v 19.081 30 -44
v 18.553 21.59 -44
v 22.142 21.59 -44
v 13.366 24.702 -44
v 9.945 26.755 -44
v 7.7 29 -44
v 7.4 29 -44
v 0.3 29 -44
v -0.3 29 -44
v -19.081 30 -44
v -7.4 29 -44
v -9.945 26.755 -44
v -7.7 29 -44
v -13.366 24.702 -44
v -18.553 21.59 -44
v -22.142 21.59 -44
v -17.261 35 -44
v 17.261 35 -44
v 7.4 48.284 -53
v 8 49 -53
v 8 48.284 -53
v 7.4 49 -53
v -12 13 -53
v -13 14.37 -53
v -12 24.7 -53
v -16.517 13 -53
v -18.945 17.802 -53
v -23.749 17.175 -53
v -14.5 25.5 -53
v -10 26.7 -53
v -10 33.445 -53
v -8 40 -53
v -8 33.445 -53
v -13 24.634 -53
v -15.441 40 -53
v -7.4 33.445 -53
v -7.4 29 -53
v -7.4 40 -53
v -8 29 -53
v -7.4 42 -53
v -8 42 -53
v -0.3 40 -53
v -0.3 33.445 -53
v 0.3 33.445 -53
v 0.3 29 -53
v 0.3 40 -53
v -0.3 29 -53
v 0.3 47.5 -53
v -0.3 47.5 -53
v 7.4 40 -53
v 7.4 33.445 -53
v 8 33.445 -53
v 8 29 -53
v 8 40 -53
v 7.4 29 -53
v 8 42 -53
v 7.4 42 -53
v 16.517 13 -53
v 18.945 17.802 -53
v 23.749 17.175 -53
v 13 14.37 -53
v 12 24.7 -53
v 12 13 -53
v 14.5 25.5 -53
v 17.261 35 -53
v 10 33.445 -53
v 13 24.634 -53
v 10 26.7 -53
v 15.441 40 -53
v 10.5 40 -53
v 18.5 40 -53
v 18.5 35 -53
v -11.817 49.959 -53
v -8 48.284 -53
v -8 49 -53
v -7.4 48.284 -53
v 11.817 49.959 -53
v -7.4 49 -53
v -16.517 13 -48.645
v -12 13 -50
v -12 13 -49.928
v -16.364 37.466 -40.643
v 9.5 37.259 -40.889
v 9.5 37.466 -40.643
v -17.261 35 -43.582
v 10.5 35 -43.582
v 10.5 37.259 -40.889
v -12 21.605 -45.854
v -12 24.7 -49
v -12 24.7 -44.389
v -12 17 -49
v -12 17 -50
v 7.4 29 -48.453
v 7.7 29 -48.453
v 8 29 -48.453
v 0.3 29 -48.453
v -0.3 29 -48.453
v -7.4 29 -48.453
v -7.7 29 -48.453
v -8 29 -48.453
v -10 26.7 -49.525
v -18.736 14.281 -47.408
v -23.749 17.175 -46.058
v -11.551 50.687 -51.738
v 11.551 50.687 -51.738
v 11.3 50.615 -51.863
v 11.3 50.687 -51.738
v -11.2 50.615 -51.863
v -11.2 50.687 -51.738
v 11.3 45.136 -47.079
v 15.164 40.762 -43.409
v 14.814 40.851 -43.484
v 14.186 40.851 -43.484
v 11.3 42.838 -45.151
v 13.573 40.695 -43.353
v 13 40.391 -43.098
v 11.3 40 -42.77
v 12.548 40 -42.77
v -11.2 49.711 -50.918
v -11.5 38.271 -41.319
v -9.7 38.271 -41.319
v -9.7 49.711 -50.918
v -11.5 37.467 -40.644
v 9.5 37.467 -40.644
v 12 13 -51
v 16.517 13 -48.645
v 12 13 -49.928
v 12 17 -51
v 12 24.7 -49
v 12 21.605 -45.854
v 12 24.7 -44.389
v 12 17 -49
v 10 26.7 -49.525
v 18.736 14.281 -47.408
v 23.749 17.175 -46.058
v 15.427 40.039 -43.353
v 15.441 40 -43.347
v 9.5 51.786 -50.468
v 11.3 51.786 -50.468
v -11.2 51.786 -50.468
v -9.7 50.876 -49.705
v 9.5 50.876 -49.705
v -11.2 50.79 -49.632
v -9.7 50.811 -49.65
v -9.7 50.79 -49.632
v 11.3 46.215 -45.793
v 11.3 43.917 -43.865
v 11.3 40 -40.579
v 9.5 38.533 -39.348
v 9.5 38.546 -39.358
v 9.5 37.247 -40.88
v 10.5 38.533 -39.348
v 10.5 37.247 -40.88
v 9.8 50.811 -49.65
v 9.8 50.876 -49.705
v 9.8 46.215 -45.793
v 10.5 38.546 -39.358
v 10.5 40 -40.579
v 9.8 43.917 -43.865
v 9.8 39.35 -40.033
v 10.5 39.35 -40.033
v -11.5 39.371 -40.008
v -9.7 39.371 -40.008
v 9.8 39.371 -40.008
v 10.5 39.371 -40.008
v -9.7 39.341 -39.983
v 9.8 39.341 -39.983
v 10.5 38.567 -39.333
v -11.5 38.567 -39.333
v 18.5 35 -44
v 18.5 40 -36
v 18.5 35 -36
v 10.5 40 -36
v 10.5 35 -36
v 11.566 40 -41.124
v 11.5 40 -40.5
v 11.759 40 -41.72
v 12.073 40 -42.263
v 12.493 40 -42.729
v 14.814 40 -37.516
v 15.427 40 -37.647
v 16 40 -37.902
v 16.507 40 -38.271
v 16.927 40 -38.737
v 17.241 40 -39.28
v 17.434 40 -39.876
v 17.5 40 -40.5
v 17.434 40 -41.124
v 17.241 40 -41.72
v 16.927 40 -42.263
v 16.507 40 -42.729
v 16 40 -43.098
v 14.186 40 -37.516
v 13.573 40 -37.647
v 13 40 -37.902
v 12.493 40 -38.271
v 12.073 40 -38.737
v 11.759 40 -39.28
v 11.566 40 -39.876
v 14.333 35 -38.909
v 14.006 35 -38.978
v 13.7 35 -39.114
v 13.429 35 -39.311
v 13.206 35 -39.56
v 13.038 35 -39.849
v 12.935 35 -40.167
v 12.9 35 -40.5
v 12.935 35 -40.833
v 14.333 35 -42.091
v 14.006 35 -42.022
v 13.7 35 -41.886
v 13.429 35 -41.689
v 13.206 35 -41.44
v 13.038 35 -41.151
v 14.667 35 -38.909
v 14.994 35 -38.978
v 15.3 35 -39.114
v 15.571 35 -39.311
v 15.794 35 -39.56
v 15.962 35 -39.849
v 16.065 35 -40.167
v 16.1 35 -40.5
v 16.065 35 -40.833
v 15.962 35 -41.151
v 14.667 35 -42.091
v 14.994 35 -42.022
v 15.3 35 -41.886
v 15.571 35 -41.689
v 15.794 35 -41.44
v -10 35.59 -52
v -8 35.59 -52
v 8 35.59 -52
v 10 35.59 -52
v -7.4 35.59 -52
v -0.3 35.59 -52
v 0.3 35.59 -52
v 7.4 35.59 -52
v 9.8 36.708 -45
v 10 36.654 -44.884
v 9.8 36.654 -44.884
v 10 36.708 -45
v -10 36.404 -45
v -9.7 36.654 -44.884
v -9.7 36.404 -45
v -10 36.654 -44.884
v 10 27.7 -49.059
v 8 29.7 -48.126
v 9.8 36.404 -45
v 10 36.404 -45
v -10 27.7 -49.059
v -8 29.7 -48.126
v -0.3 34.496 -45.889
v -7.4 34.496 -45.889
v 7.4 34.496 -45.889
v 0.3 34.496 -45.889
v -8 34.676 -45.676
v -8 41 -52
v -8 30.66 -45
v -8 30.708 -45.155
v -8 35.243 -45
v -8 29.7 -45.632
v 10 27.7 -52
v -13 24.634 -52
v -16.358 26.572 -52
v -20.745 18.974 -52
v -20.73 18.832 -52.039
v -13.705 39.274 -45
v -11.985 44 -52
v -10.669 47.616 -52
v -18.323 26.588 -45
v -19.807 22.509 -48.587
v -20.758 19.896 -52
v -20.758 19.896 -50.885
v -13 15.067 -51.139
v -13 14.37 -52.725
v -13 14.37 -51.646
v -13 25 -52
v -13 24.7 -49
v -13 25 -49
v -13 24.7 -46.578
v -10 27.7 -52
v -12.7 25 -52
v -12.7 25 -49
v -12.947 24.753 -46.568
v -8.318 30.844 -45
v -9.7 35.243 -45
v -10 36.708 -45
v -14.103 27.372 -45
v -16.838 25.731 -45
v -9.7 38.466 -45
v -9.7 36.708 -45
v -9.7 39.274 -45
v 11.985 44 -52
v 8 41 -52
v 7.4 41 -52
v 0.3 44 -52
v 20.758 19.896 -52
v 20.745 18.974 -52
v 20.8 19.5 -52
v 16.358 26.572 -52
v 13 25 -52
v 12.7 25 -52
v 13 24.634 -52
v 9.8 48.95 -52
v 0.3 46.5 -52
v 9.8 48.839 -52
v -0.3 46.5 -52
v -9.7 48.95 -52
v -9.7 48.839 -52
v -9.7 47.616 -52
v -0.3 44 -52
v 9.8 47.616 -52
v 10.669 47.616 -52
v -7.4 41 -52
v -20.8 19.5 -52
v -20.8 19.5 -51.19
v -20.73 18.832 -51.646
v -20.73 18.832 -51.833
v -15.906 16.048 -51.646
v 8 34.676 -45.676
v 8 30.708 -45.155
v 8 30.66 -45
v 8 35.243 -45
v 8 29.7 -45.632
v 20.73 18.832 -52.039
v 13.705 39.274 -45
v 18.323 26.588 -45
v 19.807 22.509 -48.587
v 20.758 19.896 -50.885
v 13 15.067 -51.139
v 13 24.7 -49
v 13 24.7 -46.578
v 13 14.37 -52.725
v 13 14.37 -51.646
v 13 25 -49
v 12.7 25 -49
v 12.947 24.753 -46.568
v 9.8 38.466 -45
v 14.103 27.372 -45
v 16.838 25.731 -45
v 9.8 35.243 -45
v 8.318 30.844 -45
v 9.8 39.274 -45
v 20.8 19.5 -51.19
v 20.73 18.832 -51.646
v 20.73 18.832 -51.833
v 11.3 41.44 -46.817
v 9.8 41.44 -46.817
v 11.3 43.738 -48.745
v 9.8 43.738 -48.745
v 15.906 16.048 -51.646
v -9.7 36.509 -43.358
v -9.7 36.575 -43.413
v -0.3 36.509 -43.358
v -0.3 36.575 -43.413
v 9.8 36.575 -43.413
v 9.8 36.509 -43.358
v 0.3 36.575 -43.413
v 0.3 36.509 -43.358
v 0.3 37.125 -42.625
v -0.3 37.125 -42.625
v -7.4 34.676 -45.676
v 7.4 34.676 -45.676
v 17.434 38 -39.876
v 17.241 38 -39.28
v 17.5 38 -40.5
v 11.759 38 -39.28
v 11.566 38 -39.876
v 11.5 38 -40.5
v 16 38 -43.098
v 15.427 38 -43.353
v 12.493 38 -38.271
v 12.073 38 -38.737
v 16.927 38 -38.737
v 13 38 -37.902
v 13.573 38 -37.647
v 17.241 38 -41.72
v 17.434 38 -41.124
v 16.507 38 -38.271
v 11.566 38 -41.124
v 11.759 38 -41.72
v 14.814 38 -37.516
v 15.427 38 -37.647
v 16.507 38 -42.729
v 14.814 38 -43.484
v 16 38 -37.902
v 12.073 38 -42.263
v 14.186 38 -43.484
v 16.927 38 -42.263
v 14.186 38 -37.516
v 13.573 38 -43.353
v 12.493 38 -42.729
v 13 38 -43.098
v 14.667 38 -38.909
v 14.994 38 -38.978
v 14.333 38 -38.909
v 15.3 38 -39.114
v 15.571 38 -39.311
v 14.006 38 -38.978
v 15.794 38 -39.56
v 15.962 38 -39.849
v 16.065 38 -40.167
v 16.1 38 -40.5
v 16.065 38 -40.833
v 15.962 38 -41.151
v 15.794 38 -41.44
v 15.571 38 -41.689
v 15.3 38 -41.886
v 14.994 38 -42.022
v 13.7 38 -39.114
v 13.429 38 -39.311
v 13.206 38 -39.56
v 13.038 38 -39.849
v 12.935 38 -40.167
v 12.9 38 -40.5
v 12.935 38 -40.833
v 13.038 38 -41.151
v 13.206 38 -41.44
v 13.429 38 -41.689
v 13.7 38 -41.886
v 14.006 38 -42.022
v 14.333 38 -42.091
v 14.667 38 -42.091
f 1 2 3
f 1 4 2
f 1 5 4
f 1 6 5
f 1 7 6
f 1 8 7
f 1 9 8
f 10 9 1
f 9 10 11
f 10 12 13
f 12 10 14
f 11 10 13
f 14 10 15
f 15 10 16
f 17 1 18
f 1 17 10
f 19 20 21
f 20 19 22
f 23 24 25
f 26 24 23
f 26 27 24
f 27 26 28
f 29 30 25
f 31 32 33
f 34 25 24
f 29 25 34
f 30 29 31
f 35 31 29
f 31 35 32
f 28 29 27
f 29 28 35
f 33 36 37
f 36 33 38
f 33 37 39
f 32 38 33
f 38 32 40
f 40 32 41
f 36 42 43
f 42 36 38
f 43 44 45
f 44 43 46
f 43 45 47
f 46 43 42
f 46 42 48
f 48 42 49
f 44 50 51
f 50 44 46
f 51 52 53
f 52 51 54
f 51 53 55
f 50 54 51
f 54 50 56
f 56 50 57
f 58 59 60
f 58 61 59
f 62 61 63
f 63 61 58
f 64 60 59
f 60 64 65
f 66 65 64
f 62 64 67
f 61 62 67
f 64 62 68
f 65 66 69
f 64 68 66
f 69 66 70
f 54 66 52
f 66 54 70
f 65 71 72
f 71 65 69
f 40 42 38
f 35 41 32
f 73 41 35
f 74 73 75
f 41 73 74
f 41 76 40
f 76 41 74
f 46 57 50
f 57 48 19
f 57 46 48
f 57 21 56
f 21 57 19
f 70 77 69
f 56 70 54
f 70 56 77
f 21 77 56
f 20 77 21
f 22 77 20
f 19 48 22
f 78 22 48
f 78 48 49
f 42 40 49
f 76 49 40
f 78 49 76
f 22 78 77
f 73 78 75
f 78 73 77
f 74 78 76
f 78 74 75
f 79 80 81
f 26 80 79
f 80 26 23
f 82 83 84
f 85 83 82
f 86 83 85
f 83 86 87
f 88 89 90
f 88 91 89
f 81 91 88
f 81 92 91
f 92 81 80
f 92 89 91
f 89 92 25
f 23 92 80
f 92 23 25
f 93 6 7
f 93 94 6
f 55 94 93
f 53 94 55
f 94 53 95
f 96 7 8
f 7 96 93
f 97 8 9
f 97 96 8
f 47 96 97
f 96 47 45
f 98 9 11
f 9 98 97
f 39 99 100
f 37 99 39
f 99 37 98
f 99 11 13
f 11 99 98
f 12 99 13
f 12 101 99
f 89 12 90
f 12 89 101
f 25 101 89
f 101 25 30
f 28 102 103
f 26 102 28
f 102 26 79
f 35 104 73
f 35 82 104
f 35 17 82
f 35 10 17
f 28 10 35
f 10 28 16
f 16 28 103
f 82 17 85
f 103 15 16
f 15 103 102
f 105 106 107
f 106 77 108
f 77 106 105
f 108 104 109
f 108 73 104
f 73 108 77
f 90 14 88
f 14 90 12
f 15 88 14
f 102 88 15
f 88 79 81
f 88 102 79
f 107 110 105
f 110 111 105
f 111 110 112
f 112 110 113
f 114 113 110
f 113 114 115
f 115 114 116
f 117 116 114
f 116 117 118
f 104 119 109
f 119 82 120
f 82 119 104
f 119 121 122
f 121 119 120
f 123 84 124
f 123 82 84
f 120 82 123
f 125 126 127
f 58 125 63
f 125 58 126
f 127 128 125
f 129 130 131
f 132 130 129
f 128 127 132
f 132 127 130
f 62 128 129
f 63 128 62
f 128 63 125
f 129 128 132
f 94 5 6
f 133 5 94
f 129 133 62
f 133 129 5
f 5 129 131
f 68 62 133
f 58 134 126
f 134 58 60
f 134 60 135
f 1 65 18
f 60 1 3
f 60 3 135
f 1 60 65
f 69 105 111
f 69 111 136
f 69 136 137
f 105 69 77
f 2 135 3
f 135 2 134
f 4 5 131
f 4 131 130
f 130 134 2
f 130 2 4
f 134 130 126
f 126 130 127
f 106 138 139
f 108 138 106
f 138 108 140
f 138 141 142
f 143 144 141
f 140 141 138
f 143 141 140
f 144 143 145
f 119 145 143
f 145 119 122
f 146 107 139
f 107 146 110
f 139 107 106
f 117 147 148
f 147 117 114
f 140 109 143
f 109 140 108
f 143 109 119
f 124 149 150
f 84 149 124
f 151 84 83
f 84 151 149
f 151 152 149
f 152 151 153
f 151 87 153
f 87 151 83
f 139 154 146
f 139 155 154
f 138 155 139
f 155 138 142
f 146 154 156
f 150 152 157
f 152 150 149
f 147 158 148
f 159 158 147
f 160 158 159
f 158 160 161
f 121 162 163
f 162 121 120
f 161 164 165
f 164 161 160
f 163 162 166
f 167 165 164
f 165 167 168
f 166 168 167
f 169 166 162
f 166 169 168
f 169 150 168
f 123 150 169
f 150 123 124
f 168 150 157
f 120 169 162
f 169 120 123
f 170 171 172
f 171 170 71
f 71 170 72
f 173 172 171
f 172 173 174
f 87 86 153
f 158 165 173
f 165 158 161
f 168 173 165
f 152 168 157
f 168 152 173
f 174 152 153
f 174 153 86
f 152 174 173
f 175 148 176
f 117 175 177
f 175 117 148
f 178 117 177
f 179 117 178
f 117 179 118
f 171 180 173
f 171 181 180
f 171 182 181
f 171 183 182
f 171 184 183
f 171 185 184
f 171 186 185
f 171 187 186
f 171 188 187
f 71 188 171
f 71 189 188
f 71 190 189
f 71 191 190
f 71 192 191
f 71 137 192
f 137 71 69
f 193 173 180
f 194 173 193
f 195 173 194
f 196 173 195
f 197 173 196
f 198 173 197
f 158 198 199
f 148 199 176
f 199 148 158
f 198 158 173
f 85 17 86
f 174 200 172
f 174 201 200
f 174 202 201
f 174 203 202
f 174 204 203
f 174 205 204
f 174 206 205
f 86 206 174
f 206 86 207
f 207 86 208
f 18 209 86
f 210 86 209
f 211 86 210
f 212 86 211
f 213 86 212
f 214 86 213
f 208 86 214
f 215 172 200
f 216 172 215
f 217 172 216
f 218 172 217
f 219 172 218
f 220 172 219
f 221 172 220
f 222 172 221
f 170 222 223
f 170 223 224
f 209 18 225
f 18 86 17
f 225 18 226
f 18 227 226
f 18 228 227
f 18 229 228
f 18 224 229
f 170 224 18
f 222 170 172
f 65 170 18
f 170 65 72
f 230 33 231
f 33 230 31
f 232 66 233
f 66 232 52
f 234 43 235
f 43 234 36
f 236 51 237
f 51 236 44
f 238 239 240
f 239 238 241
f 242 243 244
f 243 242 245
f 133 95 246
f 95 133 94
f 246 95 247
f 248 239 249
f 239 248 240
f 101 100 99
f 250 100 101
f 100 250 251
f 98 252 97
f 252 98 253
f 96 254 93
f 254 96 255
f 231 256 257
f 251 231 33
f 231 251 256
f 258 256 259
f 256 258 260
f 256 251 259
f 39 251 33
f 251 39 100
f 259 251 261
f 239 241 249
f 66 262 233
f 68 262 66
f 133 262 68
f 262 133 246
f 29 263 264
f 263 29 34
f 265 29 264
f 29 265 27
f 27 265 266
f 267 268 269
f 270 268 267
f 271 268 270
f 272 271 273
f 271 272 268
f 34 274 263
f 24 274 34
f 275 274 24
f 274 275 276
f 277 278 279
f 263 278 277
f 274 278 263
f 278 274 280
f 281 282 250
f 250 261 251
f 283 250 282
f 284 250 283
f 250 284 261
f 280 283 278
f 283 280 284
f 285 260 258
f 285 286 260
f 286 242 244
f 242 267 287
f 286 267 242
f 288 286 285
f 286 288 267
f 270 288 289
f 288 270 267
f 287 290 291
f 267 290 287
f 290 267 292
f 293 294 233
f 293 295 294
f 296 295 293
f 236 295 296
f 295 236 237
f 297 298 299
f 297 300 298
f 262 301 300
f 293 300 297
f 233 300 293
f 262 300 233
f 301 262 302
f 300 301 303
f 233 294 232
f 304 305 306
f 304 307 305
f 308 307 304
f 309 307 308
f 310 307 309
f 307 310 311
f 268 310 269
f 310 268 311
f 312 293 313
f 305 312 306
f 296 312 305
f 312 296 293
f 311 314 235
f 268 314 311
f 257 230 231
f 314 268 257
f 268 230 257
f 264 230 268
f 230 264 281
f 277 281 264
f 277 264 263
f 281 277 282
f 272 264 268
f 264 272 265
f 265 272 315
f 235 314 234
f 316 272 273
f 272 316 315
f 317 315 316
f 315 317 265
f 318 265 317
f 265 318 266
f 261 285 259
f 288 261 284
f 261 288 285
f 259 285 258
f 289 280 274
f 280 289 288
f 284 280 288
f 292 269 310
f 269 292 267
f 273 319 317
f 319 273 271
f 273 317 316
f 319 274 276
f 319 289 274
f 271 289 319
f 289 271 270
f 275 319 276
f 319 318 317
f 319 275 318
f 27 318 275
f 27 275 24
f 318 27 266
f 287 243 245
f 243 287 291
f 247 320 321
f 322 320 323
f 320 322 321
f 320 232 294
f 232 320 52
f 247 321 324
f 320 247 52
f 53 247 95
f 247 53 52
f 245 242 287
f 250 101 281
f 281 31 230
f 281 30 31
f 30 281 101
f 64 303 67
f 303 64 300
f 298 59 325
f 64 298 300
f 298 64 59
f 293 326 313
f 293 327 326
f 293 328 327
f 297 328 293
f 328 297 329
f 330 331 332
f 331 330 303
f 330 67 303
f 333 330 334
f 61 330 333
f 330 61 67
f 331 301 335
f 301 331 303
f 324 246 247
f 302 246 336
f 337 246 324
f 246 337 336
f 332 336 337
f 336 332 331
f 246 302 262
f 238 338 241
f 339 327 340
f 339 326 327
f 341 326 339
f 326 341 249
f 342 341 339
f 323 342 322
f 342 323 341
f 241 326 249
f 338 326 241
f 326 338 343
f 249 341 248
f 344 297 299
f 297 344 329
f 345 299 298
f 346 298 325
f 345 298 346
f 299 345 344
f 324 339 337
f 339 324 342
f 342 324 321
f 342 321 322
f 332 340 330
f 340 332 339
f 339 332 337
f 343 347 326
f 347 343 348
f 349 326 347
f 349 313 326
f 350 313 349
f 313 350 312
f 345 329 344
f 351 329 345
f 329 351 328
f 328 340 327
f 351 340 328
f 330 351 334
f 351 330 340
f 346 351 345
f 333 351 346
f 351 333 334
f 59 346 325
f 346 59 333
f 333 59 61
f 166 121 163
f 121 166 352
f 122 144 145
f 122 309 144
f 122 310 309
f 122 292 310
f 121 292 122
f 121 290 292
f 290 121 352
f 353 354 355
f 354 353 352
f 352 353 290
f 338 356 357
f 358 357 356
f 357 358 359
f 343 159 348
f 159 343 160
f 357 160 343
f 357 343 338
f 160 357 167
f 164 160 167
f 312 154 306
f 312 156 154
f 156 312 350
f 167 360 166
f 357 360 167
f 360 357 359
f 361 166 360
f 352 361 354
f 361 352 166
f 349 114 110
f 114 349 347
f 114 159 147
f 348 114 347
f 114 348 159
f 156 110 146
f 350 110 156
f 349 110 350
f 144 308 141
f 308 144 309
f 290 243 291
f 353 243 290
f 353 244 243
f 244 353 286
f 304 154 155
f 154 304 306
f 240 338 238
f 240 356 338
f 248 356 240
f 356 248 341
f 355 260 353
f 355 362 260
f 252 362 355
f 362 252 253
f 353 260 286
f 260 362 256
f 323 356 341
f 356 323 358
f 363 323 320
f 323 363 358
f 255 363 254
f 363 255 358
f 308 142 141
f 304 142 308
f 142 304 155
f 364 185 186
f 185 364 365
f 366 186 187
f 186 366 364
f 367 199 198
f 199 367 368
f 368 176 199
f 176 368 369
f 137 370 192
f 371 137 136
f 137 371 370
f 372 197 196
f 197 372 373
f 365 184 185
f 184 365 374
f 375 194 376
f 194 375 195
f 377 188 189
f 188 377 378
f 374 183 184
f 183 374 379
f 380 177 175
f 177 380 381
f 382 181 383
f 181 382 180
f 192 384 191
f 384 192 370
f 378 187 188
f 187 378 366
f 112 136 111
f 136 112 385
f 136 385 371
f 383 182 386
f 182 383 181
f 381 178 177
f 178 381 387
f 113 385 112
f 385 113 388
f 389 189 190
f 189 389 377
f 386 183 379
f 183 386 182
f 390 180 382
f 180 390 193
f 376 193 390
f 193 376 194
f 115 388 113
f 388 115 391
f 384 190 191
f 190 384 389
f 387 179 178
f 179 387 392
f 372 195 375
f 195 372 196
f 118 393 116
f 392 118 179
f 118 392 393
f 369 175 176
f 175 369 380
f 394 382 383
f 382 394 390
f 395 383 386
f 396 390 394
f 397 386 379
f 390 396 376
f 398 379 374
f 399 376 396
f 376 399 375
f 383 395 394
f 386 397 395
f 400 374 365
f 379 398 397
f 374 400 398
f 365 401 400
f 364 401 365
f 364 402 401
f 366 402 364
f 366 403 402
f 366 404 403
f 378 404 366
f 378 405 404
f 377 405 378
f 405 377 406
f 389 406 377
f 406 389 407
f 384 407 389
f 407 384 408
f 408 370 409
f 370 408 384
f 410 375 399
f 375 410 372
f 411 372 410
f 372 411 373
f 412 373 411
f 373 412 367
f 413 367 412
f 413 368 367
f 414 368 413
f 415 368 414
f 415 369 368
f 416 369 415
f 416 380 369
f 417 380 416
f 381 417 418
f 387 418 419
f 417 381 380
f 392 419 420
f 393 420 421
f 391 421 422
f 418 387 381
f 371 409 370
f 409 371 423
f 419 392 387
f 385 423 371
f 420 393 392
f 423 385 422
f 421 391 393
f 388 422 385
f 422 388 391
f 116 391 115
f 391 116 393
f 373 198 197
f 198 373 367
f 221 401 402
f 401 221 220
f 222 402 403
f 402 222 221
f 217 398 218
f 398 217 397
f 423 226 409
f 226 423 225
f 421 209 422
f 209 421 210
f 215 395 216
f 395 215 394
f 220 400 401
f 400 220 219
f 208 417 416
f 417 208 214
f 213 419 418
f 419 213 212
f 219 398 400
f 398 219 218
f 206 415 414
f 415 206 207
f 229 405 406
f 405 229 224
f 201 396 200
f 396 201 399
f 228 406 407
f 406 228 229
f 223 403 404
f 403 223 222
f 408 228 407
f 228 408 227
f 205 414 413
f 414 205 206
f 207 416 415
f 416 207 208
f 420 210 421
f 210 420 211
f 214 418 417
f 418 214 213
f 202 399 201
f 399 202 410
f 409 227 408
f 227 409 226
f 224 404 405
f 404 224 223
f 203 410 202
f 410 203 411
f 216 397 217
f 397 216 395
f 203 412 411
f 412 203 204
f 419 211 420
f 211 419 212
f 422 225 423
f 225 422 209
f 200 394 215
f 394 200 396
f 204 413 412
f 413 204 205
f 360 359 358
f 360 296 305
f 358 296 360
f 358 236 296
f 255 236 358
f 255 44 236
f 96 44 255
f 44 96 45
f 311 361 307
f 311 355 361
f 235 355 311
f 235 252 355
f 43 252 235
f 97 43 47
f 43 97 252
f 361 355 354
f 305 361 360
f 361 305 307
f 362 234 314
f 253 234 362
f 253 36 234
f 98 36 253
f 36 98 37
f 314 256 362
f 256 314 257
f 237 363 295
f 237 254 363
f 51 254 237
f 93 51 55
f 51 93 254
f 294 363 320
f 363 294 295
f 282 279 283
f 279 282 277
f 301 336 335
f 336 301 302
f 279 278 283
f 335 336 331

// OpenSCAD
// PRUSA iteration4
// nozzle-fan
// GNU GPL v3
// Josef Průša <iam@josefprusa.cz> and contributors
// http://www.reprap.org/wiki/Prusa_Mendel
// http://prusamendel.org


module fan()
    {
    cube([19.5,15,50]);
    translate([0,9.5,0]) cube([19.5,5.5,50]);
    translate([0,0,0]) cube([19.5,6,50]);
    translate([-1.50,6,0]) cube([1.5,3,50]);
    translate([9,-5,40]) cube([1,5.5,10]);
    }
   
module inner_half()
{
    difference()
    {
    union()
    {
        // outlets
        difference()
        {
            union()
            {
                translate([-8,12,-63]) rotate([25,0,0]) cube([18,30,6]);
                translate([-6,10.2,-60]) rotate([25,0,60]) cube([9,20,4]);
            }
            translate([-28,0,-55]) rotate([0,0,70]) cube([65,20,15]);
        }
        
        // inner body
        difference()
        {
            // base shape
            translate([-25,14,-52]) rotate([0,0,0]) cube([25,37,7]);
            translate([-14,2,-55]) rotate([0,0,60]) cube([10,20,15]);
            
            translate([-28,0,-55]) rotate([0,0,70]) cube([65,20,15]);
            difference()
            {
                // heatblock cut
                translate([-13,10,-55]) rotate([0,0,0]) cube([20,20,15]);
                translate([-16,21.7,-55]) rotate([0,0,45]) cube([20,20,15]);
            }
            
            // front shape
            translate([-8,15,-55]) rotate([25,0,0]) cube([16,30,6]);
            translate([-25,0,-55]) rotate([25,0,0]) cube([16,30,6]);
            translate([-15,51,-58]) rotate([45,0,0]) cube([16,30,6]);
        }
    }

        difference()
        {
            translate([-16.8,19.5,-55])cylinder(r=6,h = 12, $fn=30);         
            translate([-16.8,19.5,-55])cylinder(r=4,h = 30, $fn=30);         
            translate([-25,21,-58]) cube([20,20,16]);    
            translate([-18,11,-58]) cube([20,220,16]);    
        }    
        
        translate([-6,9,-56]) rotate([25,-15,60]) cube([20,25,5]);
        translate([-20,50,-54]) rotate([50,0,0]) cube([21,10,20]);
        translate([-14,2,-48]) rotate([0,50,60]) cube([10,25,18]);
        translate([-12,3.4,-60]) rotate([25,0,60]) cube([9,20,7]);
    }
}


module inner()
{
    difference()
    {
    union()
    {
    inner_half();
    mirror([1,0,0]) inner_half();

        // fan cut
        translate([9.8,48,-53]) rotate([40,0,180]) fan();
        difference()
            {
                translate([-9.7,41.65,-60.7]) rotate([50,0,0]) cube([9.75*2,20,15]);
                translate([-10,32,-67]) rotate([0,0,0]) cube([20,20,15]);
            }
    }
    translate([-20,44,-57])  cube([40,10,5]);
}
}

module outer_half()
{
    difference()
    {
        union()
        {
            translate([-25,13,-53]) rotate([0,0,0]) cube([25,39,9]);
            translate([-18,45,-55]) rotate([50,0,0]) cube([18,10,15]);
        }
        
        // front shape
        translate([-14,0,-55]) rotate([0,0,60]) cube([10,20,15]);
        
        // sides
        translate([-30,0,-55]) rotate([0,0,70]) cube([65,20,15]);
        difference()
        {
            translate([-12,9,-55]) rotate([0,0,0]) cube([20,20,15]);
            translate([-16,20.7,-55]) rotate([0,0,45]) cube([20,20,15]);
        }
        
        translate([-25,-2,-55]) rotate([25,0,0]) cube([16,30,6]);
        translate([-15,54,-58]) rotate([60,0,0]) cube([16,30,6]);
        translate([-6,8,-54]) rotate([25,-15,60]) cube([20,25,5]);
        
        translate([-20,51,-52]) rotate([50,0,0]) cube([21,10,20]);
        translate([-20,40,-63]) cube([21,10,10]);
    }
    
}


module outer()
{
    outer_half();
    mirror([1,0,0]) outer_half();
    translate([-11.2,50.5,-52]) rotate([50,0,0]) cube([22.5,2,1.3]);
    translate([9.5,50.5,-52]) rotate([50,0,0]) cube([1.8,2,17.3]);
    translate([-11.5,37.7,-42]) rotate([50,0,0]) cube([23,2.6,1.05]);
}



module nozzle_fan()
{
difference()
    {
        union()
        {
            outer();
            translate([10.5,35,-53]) cube([8,5,17]); 
        }
        inner();
        translate([14.5,46,-40.5]) rotate([90,0,0]) cylinder(r=3,h=8,$fn=30); 
        translate([14.5,45,-40.5]) rotate([90,0,0]) cylinder(r=1.6,h=30,$fn=30); 
        
        translate([-25,30,-44]) cube([50,5,17]); 
    }

    // center fin
    difference()
    {
        translate([-0.3,29,-53]) cube([0.6,20,11]);
        translate([-2.5,35.5,-41]) rotate([-45,0,0]) cube([5,20,9]);
        translate([-2.5,26,-44]) cube([5,10,9]);
        translate([-2.5,26.5,-43]) cube([5,10,9]);
    }

    // right fin
    difference()
    {
        translate([-8,29,-53]) cube([0.6,20,11]);
        translate([-9,31,-42]) rotate([-45,0,0]) cube([5,20,14]);
        translate([-9,26,-44]) cube([5,10,9]);
        translate([-9,26.5,-43]) cube([5,10,9]);
    }

    // left fin
    difference()
    {
        translate([7.4,29,-53]) cube([0.6,20,11]);
        translate([7,31,-42]) rotate([-45,0,0]) cube([5,20,14]);
        translate([7,26,-44]) cube([5,10,9]);
        translate([7,26.5,-43]) cube([5,10,9]);
    }
    
        // front sides
        translate([-13,13,-53]) cube([1,12,3]);
        translate([12,13,-53]) cube([1,12,2]);
        translate([-13,17,-52]) cube([1,8,3]);
        translate([12,17,-52]) cube([1,8,3]);
}



nozzle_fan();
